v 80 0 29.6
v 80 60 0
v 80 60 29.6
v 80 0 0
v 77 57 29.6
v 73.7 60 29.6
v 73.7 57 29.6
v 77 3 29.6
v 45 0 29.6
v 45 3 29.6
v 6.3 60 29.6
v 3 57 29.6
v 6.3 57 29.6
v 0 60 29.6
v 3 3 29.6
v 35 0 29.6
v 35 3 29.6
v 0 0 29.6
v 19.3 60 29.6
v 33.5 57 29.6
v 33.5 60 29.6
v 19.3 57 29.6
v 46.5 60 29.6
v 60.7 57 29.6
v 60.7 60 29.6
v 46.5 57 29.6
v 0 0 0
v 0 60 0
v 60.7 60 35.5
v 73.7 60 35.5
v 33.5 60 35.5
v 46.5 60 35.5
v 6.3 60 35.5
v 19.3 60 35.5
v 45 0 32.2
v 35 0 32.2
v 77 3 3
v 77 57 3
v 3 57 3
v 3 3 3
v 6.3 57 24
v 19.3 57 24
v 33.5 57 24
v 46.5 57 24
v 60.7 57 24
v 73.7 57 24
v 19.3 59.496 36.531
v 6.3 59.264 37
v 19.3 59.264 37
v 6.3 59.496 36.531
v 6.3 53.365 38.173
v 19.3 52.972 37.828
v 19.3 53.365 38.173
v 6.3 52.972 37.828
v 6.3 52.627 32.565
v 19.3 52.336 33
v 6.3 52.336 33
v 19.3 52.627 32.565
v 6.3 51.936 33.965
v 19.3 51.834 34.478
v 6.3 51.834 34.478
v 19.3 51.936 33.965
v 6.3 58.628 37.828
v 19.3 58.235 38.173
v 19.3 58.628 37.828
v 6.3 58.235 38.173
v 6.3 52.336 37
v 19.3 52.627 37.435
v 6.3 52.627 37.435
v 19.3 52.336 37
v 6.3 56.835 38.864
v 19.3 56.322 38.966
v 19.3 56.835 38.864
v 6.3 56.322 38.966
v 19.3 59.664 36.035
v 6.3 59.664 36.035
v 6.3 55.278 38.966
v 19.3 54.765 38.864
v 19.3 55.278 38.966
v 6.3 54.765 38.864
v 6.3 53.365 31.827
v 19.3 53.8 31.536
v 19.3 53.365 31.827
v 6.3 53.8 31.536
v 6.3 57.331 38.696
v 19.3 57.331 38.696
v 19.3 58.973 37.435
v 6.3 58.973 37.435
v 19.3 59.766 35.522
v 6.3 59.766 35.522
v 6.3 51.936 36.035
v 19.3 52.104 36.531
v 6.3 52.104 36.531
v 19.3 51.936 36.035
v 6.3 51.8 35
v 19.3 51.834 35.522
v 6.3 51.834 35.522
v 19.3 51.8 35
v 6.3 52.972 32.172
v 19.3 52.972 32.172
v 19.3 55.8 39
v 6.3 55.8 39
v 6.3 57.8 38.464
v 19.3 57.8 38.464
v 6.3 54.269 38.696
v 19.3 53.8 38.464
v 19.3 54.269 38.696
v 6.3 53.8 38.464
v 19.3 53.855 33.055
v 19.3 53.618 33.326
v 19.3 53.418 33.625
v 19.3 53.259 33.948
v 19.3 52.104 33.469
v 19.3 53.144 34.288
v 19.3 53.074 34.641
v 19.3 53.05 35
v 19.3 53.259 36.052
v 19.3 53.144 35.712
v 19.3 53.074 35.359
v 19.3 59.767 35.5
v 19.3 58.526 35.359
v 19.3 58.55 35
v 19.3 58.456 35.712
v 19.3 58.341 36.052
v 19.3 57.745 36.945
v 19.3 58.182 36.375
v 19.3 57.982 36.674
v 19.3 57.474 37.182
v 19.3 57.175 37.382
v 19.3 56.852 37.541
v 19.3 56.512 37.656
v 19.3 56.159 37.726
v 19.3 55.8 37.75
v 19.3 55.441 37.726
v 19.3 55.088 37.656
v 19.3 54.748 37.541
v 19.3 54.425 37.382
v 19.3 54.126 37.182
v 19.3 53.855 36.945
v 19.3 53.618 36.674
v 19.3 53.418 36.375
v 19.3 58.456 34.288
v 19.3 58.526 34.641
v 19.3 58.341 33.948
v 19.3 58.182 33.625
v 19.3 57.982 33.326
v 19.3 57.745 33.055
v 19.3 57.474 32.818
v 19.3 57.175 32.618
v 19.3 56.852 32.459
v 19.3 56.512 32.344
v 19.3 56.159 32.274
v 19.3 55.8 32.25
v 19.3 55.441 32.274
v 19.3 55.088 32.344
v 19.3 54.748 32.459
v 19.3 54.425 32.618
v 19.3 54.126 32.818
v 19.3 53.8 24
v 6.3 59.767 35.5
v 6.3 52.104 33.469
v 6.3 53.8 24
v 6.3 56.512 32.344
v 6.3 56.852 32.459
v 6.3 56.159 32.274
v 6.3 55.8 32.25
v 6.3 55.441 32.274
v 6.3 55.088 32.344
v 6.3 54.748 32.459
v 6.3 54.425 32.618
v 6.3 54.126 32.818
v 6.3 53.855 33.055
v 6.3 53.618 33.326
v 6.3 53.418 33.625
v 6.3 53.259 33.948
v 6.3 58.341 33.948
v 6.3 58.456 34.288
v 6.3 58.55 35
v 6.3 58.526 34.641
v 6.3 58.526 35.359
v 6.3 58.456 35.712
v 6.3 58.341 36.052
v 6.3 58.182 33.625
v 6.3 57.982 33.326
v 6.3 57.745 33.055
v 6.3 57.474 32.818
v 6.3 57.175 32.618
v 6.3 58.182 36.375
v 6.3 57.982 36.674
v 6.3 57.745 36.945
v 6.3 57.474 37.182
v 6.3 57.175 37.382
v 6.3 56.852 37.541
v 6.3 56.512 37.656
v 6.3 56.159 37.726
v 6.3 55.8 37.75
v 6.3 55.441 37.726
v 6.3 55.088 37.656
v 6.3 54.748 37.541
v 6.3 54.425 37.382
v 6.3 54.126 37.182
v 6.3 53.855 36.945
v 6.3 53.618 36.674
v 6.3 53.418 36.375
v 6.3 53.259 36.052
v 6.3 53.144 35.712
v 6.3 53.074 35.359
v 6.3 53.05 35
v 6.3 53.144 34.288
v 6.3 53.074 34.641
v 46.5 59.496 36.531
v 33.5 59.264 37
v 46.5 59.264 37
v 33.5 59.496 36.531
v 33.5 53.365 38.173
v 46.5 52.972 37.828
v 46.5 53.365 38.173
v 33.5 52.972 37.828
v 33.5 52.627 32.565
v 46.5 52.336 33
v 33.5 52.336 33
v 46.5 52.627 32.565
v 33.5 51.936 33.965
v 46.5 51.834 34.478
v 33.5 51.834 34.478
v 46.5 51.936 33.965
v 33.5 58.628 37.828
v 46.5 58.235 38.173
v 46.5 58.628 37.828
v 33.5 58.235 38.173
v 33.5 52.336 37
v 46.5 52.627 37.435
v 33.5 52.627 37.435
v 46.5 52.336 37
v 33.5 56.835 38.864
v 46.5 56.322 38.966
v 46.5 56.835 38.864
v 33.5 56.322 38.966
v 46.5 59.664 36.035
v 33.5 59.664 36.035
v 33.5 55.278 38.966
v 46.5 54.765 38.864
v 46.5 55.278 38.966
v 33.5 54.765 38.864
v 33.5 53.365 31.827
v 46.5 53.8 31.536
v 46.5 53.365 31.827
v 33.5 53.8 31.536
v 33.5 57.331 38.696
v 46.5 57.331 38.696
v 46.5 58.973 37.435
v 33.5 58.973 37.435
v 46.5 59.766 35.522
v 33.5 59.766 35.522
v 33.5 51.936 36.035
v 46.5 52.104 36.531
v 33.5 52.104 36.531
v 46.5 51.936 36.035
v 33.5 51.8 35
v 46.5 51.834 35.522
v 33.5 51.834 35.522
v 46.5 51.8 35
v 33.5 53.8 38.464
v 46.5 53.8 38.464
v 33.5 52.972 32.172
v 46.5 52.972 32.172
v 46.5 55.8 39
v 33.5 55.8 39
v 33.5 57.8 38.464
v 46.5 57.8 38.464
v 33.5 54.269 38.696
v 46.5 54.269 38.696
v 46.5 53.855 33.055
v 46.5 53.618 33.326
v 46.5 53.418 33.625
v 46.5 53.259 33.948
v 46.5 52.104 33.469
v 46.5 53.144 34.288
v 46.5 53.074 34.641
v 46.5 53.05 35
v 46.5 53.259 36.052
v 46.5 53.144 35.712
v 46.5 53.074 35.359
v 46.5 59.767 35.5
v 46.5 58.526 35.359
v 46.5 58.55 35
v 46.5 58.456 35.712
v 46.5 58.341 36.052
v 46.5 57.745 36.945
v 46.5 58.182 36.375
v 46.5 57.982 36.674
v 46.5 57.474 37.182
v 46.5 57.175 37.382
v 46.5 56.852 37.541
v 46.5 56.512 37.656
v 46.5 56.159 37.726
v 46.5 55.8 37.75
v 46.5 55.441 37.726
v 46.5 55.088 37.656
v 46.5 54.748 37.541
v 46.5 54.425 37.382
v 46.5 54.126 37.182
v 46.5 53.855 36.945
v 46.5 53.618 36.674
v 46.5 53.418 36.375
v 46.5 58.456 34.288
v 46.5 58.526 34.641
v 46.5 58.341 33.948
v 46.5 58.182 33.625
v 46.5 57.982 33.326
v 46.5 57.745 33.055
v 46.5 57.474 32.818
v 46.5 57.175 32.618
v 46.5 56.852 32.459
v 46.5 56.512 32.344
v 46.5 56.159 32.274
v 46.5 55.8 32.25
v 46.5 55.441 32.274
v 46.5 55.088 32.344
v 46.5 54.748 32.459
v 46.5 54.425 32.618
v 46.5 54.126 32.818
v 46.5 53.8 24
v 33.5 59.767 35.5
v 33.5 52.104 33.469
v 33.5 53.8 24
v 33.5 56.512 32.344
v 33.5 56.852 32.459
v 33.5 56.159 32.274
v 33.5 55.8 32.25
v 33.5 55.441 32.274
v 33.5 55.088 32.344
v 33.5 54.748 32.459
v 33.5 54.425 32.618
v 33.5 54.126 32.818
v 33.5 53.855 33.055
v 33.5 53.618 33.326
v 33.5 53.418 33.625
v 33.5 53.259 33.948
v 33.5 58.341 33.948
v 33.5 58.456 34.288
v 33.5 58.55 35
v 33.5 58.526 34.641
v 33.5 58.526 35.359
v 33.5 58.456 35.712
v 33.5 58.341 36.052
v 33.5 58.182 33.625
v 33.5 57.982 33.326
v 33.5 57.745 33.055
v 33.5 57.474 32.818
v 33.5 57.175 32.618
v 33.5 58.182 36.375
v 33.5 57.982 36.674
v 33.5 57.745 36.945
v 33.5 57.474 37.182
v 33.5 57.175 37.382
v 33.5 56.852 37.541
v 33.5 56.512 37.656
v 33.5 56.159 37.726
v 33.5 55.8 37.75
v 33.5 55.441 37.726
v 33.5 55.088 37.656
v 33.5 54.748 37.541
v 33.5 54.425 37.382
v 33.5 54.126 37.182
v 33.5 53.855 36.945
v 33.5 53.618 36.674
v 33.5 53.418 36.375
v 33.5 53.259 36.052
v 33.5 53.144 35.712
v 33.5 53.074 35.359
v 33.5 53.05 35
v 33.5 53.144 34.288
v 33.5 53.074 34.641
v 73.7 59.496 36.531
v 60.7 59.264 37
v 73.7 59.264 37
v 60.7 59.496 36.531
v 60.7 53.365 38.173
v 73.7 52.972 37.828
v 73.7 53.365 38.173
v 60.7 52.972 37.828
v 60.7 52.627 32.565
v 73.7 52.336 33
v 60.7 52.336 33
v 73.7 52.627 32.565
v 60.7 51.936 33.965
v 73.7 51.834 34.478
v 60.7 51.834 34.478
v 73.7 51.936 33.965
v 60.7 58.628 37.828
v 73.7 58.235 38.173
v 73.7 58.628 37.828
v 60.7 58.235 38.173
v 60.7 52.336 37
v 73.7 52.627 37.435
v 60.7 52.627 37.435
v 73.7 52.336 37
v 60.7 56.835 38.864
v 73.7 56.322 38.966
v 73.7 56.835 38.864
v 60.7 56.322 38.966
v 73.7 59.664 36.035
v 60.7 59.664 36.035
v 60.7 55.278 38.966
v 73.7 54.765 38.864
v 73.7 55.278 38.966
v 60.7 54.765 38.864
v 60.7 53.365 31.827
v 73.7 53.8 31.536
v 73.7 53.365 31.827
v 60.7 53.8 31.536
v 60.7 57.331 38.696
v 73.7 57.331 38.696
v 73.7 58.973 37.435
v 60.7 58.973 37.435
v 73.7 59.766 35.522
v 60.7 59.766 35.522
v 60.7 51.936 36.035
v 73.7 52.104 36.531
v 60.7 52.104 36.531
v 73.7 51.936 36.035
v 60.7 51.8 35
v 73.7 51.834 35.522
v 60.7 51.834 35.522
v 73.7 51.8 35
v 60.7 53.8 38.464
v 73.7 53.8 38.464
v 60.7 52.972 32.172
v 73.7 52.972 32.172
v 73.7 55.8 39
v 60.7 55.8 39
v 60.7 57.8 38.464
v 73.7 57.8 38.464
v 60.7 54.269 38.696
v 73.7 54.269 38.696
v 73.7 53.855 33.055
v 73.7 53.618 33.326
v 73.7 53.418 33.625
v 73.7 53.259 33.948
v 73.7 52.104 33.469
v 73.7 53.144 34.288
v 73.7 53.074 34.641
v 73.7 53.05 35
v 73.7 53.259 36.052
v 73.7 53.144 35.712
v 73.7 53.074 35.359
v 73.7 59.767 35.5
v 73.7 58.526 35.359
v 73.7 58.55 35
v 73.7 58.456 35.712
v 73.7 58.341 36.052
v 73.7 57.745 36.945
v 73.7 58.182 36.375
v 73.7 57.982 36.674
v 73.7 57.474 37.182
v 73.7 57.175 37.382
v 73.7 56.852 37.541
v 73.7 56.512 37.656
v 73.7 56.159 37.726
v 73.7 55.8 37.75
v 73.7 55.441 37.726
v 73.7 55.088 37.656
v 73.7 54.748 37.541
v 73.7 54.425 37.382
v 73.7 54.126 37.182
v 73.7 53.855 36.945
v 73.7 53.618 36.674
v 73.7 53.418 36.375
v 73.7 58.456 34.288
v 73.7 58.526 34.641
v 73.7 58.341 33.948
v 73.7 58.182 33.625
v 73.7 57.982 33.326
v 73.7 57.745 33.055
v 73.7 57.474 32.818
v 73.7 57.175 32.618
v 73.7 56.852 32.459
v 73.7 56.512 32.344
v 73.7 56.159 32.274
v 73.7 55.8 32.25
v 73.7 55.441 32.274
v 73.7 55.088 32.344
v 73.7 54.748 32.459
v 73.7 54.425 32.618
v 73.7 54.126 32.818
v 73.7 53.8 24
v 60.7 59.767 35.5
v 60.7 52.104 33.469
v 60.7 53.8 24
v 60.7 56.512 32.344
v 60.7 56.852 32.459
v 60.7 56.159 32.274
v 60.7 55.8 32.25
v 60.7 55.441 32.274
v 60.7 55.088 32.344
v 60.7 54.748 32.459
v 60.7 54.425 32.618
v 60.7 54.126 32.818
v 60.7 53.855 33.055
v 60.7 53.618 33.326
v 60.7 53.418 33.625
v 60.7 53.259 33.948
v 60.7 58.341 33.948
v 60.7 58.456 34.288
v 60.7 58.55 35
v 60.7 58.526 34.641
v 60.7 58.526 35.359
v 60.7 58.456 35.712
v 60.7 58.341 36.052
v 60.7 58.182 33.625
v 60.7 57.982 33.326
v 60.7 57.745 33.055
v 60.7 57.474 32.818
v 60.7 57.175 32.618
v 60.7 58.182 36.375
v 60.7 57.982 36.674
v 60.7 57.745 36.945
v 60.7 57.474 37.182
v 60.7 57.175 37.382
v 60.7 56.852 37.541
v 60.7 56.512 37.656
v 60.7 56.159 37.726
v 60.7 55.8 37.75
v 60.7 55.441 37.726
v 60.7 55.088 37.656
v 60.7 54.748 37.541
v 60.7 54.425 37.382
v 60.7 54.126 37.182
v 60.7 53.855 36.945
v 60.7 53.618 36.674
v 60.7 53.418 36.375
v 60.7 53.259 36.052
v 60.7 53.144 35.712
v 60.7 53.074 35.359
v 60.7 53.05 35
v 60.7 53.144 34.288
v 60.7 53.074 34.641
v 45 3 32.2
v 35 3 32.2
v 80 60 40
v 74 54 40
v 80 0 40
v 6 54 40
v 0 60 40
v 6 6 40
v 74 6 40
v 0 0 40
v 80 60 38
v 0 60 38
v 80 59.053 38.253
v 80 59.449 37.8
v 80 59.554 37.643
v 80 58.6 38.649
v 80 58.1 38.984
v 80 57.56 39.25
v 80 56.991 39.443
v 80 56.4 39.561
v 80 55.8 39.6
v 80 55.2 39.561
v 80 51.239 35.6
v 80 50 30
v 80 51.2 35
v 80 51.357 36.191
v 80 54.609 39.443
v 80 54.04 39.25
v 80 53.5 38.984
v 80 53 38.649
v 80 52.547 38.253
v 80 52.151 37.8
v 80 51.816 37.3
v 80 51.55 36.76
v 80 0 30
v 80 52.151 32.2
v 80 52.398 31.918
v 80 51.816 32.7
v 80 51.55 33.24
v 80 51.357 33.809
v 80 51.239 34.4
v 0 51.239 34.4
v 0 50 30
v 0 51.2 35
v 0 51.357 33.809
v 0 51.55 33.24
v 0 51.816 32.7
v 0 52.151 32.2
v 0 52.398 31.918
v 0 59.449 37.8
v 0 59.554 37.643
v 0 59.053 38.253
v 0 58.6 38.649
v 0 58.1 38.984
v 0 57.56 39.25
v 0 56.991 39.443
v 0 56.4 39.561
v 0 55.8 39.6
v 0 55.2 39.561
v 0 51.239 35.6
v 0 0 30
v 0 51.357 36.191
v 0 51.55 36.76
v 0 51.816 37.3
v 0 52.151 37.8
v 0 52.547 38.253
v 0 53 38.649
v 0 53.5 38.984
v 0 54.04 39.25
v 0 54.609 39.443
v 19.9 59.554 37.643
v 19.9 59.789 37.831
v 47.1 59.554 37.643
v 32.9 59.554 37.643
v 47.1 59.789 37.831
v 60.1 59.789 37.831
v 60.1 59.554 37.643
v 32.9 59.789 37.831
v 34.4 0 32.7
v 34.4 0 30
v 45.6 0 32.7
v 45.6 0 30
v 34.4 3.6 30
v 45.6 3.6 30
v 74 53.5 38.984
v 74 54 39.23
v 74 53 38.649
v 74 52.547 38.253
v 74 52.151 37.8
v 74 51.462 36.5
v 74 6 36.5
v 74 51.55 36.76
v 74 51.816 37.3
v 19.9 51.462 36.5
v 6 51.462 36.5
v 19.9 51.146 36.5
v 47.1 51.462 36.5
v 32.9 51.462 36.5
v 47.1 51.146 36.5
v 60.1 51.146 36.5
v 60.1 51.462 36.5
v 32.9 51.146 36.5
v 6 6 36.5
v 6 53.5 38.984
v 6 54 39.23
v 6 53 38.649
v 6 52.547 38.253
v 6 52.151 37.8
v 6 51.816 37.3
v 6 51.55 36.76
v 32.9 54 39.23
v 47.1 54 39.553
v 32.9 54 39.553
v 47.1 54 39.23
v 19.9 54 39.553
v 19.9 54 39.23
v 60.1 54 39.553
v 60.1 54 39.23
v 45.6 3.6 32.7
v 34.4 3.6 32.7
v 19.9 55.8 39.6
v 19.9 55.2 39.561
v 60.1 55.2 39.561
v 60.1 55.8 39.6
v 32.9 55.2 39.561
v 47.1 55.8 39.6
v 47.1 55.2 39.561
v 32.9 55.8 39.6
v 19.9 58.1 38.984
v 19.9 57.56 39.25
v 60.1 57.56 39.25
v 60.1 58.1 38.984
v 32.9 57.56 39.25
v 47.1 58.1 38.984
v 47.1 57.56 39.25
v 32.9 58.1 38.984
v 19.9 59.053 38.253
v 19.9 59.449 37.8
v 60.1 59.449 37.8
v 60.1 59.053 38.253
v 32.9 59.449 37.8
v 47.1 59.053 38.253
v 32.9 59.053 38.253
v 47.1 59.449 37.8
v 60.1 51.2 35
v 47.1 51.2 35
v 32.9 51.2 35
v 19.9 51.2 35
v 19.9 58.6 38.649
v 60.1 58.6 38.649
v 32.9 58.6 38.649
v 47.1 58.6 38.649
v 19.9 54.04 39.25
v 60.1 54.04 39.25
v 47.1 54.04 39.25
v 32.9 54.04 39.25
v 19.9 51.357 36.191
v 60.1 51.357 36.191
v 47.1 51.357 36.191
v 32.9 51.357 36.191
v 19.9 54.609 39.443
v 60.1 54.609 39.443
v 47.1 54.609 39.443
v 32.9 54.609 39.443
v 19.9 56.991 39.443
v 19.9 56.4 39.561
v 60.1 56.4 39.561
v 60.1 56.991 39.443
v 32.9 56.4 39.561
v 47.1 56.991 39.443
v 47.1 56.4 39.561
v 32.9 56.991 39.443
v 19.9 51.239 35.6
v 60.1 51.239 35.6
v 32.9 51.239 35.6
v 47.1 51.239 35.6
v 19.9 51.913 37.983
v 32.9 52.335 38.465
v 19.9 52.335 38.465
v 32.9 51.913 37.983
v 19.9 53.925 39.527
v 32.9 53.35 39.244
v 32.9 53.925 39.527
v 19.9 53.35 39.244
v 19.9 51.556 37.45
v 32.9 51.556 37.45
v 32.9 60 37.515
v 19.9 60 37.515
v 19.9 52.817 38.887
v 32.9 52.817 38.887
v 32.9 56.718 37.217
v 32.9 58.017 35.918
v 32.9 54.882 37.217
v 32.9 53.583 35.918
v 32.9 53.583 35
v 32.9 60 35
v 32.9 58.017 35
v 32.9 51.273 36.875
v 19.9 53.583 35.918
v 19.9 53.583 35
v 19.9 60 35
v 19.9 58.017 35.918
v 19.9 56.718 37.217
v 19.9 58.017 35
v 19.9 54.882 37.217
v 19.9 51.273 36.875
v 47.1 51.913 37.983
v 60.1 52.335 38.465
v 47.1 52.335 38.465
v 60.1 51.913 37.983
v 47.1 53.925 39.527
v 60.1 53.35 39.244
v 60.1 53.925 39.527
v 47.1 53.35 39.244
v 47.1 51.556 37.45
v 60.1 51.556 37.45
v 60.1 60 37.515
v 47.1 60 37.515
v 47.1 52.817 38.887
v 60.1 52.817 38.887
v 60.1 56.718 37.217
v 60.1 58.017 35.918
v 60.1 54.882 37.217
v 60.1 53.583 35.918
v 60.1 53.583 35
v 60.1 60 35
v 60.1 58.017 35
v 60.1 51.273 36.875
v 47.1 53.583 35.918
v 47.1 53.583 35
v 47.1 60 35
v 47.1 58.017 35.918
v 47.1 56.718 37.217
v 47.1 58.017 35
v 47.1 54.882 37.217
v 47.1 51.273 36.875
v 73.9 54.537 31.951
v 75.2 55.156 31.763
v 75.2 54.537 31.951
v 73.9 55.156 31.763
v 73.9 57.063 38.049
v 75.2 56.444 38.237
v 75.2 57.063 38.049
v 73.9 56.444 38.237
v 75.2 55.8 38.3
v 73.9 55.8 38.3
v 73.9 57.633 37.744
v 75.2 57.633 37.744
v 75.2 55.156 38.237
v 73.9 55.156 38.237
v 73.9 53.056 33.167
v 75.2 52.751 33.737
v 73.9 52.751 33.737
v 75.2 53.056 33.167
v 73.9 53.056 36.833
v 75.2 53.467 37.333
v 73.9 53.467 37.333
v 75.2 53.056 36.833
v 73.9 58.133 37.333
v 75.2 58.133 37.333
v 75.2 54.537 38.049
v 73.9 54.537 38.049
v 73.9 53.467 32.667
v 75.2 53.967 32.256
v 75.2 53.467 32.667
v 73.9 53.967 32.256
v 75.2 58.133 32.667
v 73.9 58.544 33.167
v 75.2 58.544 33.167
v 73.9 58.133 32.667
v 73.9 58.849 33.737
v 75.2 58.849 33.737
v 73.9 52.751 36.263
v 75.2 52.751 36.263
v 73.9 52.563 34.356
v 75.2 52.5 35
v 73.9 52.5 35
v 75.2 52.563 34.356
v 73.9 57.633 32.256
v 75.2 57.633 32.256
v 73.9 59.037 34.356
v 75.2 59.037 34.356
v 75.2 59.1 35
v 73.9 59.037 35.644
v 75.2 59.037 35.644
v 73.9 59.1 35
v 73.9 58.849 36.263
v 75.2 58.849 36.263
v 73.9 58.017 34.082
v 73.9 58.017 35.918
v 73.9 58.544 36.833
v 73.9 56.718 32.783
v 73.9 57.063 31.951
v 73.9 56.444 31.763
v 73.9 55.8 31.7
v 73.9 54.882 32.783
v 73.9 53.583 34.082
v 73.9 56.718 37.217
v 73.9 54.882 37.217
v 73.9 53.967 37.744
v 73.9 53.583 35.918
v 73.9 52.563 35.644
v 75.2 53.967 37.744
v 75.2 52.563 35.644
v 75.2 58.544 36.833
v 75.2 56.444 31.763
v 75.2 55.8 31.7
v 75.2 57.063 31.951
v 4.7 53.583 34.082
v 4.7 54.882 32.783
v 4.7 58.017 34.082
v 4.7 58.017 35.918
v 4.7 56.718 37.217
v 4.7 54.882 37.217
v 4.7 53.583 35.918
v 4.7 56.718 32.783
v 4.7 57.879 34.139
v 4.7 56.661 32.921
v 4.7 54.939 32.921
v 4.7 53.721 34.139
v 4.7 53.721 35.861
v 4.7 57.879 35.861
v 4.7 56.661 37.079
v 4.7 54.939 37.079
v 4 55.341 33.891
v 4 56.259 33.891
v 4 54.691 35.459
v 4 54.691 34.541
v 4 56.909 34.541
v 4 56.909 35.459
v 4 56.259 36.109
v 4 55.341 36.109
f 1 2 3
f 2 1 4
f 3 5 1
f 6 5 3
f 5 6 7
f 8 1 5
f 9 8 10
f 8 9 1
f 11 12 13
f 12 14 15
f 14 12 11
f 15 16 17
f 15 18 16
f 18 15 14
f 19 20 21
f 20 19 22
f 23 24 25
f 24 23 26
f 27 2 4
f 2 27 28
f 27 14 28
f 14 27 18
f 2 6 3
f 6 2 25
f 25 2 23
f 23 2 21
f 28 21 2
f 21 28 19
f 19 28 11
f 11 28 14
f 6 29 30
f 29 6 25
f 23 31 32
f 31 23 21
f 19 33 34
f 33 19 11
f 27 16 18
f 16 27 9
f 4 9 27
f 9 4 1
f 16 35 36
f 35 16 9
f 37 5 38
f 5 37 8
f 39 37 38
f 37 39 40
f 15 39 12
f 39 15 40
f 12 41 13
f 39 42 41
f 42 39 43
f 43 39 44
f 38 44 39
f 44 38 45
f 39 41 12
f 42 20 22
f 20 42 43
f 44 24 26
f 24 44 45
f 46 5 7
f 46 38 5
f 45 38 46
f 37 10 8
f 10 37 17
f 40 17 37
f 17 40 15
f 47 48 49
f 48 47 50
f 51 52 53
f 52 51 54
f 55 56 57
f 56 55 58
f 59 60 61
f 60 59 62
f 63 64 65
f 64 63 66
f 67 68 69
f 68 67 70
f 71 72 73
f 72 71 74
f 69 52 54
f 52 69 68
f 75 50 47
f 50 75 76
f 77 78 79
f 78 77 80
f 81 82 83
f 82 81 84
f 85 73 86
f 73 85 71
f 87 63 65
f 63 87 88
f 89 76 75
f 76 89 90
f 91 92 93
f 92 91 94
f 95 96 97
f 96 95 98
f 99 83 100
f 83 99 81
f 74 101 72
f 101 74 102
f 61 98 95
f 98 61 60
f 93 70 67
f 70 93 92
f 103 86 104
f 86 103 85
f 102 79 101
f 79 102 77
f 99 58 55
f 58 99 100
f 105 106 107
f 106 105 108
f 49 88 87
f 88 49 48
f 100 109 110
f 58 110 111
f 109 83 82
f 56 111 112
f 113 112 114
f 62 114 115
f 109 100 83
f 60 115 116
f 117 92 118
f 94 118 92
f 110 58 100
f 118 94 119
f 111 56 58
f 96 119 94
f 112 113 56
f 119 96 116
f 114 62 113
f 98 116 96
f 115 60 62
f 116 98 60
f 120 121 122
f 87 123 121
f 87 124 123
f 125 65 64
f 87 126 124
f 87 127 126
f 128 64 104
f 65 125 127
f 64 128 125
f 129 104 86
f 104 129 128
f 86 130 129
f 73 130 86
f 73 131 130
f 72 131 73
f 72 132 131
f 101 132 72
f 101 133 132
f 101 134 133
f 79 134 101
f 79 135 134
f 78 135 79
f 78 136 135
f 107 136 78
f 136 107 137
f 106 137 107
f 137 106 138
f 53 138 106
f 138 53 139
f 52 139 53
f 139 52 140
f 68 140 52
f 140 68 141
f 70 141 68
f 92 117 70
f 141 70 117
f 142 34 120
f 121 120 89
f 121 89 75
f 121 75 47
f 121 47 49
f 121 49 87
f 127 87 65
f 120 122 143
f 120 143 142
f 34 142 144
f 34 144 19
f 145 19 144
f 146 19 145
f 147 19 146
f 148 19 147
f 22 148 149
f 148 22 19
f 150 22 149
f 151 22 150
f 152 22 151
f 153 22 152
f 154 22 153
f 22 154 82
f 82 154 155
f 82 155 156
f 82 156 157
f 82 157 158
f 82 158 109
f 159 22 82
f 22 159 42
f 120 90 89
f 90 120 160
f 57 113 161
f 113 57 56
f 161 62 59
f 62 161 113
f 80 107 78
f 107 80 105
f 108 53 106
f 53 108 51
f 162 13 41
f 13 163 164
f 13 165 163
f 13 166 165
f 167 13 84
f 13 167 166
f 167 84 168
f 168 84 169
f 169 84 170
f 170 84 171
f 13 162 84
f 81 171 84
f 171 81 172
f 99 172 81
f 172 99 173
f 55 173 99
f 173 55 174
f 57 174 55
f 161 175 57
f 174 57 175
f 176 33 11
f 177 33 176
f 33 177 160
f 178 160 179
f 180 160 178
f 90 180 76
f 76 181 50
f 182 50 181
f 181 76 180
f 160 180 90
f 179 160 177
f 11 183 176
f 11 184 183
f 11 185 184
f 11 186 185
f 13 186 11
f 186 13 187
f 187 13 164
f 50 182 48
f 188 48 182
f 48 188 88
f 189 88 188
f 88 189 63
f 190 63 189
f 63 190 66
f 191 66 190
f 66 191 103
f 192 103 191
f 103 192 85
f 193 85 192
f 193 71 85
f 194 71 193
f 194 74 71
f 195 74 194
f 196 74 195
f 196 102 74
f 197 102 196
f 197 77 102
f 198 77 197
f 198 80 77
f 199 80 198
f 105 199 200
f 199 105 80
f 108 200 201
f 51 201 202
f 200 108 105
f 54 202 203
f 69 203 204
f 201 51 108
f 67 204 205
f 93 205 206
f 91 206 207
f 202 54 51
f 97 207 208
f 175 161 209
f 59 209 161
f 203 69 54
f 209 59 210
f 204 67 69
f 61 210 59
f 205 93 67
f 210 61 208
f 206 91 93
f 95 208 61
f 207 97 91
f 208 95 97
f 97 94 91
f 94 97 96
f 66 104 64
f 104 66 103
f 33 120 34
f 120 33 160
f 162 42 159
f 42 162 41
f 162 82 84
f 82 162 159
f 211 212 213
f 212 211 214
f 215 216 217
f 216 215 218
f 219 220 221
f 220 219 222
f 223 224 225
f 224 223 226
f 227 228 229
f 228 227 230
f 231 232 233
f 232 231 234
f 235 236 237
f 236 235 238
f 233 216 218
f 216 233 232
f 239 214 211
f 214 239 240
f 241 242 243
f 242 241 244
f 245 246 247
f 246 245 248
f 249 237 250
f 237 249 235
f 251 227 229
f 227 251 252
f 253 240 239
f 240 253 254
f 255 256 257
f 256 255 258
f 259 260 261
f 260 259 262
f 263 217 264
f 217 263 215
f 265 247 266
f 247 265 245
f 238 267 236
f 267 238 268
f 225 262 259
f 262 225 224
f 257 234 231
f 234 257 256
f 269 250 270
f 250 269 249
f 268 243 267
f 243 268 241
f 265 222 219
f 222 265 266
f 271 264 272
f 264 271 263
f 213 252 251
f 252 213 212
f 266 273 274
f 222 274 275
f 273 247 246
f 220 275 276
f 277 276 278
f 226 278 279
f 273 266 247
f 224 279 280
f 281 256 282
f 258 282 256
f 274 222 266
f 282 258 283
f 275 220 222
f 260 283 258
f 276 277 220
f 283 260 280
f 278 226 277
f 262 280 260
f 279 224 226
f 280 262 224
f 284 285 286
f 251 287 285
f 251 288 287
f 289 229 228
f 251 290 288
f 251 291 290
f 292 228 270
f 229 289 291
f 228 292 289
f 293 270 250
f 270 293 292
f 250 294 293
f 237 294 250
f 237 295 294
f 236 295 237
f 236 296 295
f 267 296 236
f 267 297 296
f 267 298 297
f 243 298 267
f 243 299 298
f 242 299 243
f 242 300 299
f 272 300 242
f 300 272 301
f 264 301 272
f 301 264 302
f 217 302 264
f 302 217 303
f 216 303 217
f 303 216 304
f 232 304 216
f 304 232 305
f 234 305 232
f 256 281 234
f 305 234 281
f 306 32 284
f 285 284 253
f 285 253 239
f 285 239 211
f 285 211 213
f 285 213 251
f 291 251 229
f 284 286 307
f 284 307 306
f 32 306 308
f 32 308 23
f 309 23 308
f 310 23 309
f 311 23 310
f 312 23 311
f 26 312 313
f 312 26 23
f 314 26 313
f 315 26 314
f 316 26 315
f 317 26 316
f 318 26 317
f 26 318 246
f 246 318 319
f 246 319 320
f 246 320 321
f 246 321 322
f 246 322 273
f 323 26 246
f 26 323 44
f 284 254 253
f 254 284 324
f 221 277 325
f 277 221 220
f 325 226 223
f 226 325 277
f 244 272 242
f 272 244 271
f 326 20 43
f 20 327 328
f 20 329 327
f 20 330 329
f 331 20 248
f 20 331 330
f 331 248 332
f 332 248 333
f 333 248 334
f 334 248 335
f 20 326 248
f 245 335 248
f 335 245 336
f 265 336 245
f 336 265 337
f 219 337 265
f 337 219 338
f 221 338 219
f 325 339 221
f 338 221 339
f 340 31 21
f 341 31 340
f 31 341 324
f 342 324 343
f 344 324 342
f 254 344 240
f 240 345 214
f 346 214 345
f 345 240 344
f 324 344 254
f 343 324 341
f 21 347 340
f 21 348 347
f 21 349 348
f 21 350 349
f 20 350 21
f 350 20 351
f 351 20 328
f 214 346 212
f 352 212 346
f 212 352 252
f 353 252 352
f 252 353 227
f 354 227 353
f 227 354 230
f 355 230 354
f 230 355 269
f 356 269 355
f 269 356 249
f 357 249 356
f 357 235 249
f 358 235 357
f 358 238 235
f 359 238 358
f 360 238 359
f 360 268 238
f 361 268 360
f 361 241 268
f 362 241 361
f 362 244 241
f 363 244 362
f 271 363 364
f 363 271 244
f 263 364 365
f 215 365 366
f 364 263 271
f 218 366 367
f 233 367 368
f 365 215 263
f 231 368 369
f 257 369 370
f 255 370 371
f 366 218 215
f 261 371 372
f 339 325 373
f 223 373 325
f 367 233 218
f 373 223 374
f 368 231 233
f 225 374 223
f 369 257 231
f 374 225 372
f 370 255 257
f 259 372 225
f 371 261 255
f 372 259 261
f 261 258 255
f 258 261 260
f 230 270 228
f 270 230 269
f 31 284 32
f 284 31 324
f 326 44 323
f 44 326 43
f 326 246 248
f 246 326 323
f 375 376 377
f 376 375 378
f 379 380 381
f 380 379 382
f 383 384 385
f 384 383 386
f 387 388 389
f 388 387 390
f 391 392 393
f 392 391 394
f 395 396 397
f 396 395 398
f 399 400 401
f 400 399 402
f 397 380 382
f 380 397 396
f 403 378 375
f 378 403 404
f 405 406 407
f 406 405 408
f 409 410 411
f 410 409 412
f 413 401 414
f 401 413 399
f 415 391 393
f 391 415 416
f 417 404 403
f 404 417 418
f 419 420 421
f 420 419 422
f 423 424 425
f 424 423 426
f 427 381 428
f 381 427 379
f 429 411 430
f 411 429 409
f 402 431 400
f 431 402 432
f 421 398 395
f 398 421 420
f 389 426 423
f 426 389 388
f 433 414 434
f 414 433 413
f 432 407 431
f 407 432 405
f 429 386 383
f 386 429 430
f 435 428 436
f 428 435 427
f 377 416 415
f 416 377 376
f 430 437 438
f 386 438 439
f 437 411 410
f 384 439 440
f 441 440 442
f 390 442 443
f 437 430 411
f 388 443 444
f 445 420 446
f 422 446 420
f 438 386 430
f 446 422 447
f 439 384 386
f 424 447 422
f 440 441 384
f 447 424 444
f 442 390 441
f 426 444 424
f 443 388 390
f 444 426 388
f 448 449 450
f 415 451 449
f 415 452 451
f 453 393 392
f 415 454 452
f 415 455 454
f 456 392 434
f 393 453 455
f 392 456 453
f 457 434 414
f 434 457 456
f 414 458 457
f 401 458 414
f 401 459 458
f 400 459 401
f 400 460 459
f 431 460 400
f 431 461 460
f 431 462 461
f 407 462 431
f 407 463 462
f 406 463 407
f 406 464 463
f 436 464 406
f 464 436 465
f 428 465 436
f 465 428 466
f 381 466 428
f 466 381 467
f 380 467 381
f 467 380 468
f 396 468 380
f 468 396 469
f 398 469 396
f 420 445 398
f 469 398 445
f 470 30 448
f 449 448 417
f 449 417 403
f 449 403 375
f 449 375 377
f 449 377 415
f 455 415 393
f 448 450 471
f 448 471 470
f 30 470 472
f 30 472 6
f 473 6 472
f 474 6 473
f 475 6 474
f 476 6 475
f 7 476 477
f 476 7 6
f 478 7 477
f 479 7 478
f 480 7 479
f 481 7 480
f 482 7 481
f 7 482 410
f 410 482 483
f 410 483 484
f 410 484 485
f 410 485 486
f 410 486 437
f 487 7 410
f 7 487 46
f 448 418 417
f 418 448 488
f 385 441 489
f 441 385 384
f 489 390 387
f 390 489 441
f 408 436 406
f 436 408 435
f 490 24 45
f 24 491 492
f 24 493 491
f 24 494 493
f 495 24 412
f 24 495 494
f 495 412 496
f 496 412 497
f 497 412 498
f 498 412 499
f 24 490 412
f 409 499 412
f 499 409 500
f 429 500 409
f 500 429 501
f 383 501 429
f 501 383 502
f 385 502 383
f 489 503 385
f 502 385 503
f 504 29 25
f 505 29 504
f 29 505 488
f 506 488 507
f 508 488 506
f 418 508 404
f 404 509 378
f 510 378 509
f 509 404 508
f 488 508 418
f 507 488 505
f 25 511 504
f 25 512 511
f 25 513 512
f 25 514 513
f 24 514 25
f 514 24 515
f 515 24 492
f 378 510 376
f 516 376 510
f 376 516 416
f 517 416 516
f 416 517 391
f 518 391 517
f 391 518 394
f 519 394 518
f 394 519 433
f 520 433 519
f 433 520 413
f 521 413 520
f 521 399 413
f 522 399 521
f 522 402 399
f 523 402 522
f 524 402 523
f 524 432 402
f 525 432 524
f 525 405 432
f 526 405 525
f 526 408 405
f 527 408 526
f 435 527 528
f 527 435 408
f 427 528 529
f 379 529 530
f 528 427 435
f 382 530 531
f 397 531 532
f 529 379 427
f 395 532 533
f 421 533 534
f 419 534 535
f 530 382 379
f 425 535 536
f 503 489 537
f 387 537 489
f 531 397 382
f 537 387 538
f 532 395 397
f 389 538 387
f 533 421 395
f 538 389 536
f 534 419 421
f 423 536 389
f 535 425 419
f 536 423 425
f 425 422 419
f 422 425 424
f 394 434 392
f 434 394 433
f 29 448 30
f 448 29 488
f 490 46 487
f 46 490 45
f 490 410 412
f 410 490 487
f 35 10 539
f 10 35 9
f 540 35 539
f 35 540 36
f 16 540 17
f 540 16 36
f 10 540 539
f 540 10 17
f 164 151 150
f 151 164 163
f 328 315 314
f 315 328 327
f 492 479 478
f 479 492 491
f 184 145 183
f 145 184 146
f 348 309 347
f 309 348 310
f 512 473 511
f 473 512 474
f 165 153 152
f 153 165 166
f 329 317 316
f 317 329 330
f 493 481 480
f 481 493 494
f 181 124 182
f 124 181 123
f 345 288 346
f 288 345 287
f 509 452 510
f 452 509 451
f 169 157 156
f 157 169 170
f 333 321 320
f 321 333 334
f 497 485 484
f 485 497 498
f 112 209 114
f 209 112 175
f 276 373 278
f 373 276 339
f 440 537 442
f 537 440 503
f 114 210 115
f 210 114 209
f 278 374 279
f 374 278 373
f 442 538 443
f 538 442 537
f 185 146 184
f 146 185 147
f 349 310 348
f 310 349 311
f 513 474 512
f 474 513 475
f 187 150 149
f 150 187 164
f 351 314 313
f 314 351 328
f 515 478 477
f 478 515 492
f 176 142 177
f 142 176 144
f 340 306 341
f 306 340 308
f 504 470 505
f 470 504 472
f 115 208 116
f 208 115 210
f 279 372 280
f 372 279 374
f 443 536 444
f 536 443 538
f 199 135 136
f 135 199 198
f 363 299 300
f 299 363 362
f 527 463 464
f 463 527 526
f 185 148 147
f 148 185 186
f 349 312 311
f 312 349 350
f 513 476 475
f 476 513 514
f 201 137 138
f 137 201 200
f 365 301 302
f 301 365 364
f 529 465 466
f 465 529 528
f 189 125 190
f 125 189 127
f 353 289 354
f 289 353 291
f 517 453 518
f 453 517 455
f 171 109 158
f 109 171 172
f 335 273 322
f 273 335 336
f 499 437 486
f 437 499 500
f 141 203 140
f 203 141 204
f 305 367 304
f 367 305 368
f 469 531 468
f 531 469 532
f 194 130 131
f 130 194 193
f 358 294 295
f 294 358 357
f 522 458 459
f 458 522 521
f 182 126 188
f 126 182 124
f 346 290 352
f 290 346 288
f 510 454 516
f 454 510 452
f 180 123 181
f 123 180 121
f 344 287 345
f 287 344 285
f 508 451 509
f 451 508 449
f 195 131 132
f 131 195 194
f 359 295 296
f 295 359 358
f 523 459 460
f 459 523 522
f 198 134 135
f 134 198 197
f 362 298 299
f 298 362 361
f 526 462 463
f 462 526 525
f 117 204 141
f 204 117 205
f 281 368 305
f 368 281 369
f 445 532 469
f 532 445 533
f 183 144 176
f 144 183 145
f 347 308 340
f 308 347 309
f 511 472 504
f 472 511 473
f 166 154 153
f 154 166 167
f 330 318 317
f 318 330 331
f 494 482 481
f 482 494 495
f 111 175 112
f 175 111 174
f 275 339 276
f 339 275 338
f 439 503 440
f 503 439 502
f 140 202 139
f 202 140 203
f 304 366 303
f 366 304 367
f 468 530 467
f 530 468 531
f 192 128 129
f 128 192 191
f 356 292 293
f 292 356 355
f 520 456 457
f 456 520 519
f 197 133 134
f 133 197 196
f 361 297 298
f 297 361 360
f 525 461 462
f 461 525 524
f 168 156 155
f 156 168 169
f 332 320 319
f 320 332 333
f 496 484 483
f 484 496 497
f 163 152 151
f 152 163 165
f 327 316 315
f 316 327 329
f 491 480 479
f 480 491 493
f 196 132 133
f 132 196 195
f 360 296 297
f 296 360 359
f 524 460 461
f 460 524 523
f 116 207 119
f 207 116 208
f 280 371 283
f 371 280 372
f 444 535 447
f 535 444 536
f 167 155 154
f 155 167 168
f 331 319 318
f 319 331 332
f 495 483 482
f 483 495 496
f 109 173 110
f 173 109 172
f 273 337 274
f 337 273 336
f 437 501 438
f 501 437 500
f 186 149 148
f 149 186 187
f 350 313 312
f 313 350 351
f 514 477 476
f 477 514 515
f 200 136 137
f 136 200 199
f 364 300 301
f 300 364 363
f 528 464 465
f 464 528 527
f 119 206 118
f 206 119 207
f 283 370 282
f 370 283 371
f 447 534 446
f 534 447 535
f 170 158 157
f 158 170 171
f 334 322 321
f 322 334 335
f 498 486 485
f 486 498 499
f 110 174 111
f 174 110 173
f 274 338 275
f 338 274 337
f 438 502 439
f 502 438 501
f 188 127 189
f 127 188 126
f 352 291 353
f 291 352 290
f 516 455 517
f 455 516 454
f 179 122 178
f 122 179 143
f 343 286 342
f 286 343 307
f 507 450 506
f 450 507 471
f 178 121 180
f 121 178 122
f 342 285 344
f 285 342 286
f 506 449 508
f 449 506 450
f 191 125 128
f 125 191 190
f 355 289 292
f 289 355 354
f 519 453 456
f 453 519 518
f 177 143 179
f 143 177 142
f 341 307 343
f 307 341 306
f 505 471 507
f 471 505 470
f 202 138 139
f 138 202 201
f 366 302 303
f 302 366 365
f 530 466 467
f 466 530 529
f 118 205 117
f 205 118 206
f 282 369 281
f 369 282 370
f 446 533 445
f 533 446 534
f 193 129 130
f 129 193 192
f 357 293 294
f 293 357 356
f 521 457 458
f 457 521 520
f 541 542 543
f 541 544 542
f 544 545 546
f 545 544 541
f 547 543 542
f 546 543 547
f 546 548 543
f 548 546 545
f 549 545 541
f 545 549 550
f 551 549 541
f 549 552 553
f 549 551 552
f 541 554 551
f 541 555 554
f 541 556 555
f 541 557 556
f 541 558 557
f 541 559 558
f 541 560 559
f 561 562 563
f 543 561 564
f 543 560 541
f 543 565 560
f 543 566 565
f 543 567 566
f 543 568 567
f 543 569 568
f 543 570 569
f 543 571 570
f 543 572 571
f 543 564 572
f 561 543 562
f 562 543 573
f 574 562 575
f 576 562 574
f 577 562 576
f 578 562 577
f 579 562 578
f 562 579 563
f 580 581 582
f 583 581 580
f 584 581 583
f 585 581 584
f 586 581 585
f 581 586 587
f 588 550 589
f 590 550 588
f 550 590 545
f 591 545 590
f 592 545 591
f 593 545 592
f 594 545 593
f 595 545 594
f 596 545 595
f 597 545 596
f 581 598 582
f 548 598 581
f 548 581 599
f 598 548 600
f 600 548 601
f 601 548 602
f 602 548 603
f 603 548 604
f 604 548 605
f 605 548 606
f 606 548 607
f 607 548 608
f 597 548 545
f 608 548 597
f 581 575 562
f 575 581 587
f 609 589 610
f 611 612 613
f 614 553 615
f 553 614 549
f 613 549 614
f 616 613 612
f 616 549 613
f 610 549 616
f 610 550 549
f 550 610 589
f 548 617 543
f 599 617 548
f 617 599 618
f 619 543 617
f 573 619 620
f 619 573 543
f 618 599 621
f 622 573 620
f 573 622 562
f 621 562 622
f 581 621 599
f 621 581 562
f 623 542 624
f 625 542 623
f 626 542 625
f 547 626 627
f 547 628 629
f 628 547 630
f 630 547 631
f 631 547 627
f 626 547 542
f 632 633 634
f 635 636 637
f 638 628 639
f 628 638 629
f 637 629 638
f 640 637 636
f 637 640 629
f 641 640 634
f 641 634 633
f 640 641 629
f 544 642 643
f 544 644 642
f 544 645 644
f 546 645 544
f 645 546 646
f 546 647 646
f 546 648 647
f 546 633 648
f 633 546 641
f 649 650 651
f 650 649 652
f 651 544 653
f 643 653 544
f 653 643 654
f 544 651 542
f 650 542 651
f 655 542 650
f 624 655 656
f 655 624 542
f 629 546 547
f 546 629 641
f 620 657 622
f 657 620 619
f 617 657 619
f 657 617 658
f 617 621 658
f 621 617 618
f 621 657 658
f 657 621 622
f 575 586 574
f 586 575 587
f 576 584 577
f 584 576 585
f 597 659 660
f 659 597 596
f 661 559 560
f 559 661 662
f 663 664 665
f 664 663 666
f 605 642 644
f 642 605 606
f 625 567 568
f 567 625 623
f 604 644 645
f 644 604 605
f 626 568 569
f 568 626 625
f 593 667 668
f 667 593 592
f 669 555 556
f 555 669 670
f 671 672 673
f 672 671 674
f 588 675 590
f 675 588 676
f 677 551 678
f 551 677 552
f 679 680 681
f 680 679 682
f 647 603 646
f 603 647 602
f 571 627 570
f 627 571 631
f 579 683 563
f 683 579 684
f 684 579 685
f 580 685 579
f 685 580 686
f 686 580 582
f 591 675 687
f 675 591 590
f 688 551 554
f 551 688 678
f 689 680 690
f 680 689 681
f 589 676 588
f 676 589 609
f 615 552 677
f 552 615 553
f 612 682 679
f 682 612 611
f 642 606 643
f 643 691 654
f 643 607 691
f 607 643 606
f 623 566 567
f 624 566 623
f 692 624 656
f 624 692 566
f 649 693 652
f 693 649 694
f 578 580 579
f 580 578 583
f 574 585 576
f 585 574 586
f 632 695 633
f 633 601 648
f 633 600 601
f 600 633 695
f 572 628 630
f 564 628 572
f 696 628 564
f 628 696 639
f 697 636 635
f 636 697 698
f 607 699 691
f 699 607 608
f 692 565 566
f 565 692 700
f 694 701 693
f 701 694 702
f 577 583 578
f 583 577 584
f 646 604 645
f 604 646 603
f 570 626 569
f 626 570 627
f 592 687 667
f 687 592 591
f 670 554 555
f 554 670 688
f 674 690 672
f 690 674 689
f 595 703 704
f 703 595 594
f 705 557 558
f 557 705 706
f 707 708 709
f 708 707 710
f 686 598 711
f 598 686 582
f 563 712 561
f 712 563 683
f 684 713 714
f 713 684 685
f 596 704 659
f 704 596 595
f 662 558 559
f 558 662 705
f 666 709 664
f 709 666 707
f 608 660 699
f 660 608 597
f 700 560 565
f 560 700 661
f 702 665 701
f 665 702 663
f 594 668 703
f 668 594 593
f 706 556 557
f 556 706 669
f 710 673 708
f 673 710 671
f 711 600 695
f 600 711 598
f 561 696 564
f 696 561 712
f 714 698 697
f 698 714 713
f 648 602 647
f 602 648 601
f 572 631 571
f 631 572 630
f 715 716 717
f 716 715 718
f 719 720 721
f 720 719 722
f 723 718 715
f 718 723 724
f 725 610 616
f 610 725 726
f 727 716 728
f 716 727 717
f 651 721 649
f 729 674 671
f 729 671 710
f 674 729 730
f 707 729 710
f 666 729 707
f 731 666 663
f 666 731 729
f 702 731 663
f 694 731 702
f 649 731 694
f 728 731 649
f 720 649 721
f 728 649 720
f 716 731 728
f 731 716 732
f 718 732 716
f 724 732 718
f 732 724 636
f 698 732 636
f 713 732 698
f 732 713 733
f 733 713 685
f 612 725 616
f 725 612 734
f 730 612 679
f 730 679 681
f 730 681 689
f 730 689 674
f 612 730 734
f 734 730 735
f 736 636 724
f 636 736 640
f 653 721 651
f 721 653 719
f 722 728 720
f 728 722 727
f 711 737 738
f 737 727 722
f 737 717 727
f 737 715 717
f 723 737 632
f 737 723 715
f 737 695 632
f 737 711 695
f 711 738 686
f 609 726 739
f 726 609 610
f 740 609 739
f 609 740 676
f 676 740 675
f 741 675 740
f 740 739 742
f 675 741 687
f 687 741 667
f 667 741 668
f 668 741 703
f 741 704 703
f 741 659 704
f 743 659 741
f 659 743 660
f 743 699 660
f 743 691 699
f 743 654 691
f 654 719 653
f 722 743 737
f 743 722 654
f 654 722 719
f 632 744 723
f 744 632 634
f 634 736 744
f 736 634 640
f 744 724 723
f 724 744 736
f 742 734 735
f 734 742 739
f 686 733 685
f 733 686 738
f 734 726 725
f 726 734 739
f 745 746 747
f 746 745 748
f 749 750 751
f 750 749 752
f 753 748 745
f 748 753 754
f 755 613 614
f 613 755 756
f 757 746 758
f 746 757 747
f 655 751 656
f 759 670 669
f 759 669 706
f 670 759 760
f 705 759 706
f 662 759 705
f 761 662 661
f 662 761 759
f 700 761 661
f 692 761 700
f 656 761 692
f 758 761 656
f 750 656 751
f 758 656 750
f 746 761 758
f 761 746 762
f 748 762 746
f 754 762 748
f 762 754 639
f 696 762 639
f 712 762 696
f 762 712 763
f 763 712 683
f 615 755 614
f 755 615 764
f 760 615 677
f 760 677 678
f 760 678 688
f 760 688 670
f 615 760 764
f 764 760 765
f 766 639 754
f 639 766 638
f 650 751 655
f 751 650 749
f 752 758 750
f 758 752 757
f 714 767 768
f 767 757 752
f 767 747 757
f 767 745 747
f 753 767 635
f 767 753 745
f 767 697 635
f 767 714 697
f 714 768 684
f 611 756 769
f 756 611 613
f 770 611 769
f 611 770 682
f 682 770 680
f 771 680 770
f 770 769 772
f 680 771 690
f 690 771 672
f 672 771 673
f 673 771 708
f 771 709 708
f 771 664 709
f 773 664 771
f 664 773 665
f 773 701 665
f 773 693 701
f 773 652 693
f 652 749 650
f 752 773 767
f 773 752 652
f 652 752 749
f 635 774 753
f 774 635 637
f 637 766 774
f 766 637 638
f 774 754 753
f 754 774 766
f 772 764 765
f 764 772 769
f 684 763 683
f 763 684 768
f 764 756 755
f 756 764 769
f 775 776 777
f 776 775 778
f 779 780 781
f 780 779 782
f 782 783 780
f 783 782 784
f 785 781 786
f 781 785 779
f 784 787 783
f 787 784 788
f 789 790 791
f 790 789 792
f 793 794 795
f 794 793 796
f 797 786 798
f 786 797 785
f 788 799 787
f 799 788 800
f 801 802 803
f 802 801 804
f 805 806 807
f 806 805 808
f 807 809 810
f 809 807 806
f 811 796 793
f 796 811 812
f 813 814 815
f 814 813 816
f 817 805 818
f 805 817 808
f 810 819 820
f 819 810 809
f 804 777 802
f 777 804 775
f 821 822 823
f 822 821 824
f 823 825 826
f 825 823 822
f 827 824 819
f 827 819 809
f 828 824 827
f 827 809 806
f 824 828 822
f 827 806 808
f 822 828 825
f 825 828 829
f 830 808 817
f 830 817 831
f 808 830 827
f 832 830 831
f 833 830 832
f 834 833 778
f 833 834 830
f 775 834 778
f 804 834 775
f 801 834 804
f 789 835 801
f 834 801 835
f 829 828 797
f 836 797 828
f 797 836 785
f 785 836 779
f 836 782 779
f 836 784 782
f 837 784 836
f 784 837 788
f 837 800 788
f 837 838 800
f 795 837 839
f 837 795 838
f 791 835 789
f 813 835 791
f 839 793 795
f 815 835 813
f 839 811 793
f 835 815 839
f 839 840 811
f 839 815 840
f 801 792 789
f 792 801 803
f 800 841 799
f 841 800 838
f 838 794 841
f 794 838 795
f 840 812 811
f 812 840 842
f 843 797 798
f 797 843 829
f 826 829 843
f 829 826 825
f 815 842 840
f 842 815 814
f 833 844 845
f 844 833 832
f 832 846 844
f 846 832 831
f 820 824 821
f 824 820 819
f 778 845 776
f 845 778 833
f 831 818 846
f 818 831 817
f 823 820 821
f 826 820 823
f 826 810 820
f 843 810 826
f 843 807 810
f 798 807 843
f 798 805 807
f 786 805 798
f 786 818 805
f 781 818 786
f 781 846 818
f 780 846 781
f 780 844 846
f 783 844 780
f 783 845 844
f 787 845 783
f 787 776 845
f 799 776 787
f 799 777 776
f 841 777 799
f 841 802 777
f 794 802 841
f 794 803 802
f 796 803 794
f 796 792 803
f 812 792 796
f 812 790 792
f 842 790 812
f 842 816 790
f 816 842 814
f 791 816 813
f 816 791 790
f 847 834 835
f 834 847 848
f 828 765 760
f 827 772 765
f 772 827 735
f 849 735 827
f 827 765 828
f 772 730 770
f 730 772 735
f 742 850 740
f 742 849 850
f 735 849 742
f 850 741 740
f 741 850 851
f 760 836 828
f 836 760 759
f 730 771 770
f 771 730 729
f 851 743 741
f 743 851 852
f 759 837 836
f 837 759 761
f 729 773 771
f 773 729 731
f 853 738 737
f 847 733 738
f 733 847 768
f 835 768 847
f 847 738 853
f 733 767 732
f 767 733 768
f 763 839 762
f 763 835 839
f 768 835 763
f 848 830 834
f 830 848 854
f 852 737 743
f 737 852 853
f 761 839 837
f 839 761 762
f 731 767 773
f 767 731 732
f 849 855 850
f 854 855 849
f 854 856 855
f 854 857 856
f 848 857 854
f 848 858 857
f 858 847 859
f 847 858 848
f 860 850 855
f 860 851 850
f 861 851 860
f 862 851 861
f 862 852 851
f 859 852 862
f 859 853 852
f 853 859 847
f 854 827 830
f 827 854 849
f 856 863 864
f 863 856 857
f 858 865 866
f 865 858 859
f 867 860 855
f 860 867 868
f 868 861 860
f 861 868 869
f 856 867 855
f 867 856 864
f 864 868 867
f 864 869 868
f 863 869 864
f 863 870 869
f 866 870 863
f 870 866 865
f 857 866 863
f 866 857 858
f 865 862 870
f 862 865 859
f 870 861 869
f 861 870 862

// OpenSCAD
// Print-in-place hinged box, 80 x 60 x 40 mm closed.
// Printed closed in PLA (Bambu A1, 0.4 nozzle): base, lid and a captive
// hinge pin are separate bodies with 0.35-0.6 mm clearances, so the hinge
// breaks free by hand.  No supports: the lid underside bridges the cavity,
// the hinge barrels/pin use faceted (octagonal) lower surfaces, and all
// other downward faces are short bridges or rest on the body below.

/* [Part] */
part = "assembly"; // [assembly, box, lid, pin]

/* [Dimensions] */
box_w = 80;          // X, outside
box_d = 60;          // Y, outside (front y=0, back y=60)
box_h = 29.6;        // base height to its rim
lid_h = 10;          // lid height; lid bottom at z=30 (0.4 gap)
lid_z = 30;
wall = 3;
floor_t = 3;
total_h = 40;

hinge_y = 55.8;      // hinge axis, assembly coords
hinge_z = 35;
barrel_r = 4.0;
pin_r = 2.4;         // octagon circumradius
bore_r = 2.75;       // pin_r + 0.35 radial clearance
relief_r = 4.6;      // barrel_r + 0.6

// Alternating knuckles along the back edge (x intervals), 0.6 mm end gaps.
box_segs  = [[6.3, 19.3], [33.5, 46.5], [60.7, 73.7]];
lid_segs  = [[19.9, 32.9], [47.1, 60.1]];

cadverify_only = "";
module instance(name, part_name, unit = 1) {
    echo(cadverify_instance = [name, part_name, unit]);
    if (cadverify_only == "" || cadverify_only == name) children();
}

// ---------------------------------------------------------------- base (box)
module box_main() {
    difference() {
        union() {
            // shell: outer block minus open-top cavity
            difference() {
                cube([box_w, box_d, box_h]);
                translate([wall, wall, floor_t]) cube([box_w - 2 * wall, box_d - 2 * wall, box_h]);
            }
            // hinge knuckles (base) + support posts down to the back wall
            for (s = box_segs) {
                translate([s[0], hinge_y, hinge_z]) rotate([0, 90, 0])
                    cylinder(h = s[1] - s[0], r = barrel_r, $fn = 48);
                translate([s[0], 53.8, 24]) cube([s[1] - s[0], 6.2, 11.5]);
            }
            // front catch tooth (enters the socket in the lid)
            translate([35, 0, box_h]) cube([10, wall, 2.6]);
        }
        // pin bore through the base knuckles
        translate([-1, hinge_y, hinge_z]) rotate([0, 90, 0])
            cylinder(h = box_w + 2, r = bore_r, $fn = 48);
    }
}

// ---------------------------------------------------------------- lid (local: z 0..10, hinge axis at z=5)
module lid_main() {
    union() {
        difference() {
            union() {
                // main slab, side profile (Y-Z) extruded along X.
                // Rear lower edge chamfered 50,0 -> 60,8 so the slab
                // swings clear of the base back wall.
                rotate([0, 90, 0])
                    linear_extrude(height = box_w)
                        polygon(points = [[0, 0], [0, 50], [-8, 60], [-10, 60], [-10, 0]]);
                // hinge knuckles (lid)
                for (s = lid_segs)
                    translate([s[0], hinge_y, 5]) rotate([0, 90, 0])
                        cylinder(h = s[1] - s[0], r = barrel_r, $fn = 48);
            }
            // recessed panel in the top face
            translate([6, 6, 6.5]) cube([68, 48, 4]);
            // front catch socket (tooth: x35..45, z assy 29.6..32.2)
            translate([34.4, -1, -0.5]) cube([11.2, 4.6, 3.2]);
            // clearance tunnel for the base knuckles / pin
            translate([-1, hinge_y, 5]) rotate([0, 90, 0])
                cylinder(h = box_w + 2, r = relief_r, $fn = 48);
            // pin bore through the lid knuckles
            translate([-1, hinge_y, 5]) rotate([0, 90, 0])
                cylinder(h = box_w + 2, r = bore_r, $fn = 48);
        }
        // webs joining lid knuckles to the slab: upper half-discs r=4.9
        // (stay above z=30.1 in assembly, clear of the base rim at 29.6)
        for (s = lid_segs)
            intersection() {
                translate([s[0], hinge_y, 5]) rotate([0, 90, 0])
                    cylinder(h = s[1] - s[0], r = 4.9, $fn = 48);
                translate([s[0], hinge_y - 10, 5]) cube([s[1] - s[0], 20, 5]);
                translate([s[0], 0, 0]) cube([s[1] - s[0], box_d, lid_h]);
            }
    }
}

// ---------------------------------------------------------------- pin
// Centred on its axis, local +Z from head (z=0) to tip (z=71.2).
module pin_geom() {
    union() {
        cylinder(h = 1.3, r = 3.3, $fn = 32);                    // head
        translate([0, 0, 1.0]) rotate([0, 0, 22.5])
            cylinder(h = 69.5, r = pin_r, $fn = 8);              // octagonal shaft
        translate([0, 0, 70.4]) rotate([0, 0, 22.5])
            cylinder(h = 0.8, r1 = pin_r, r2 = 1.2, $fn = 8);    // lead-in tip
    }
}
module pin_part() { translate([3.3, 3.3, 0]) pin_geom(); }

// ---------------------------------------------------------------- output
if (part == "box") {
    echo(cadverify_spec = [
        ["bounds", [[0, 0, 0], [box_w, box_d, hinge_z + barrel_r]]],
        ["bodies", 1],
        ["copies", 1],
        ["support_faces", [["bed", "-z", 4000]]],
        ["overhangs_allowed", [["hinge knuckles and pin bore print in place; faceted bore ceiling is a short internal bridge", [[5, 51, 30], [75, 60, 39.5]]]]],
        ["details", [
            ["cavity", "void", [[4, 4, 10], [76, 53, 29]], 0.95],
            ["front_wall", "thickness", [40, -1, 15], [0, 1, 0], 3],
            ["floor", "thickness", [40, 30, -1], [0, 0, 1], 3],
            ["box_knuckle", "material", [[7, 52, 33.5], [18, 53.8, 36.5]], 0.6],
            ["pin_bore", "void", [[8, 54.9, 34.1], [17, 56.7, 35.9]], 0.9],
            ["catch_tooth", "material", [[36, 0.5, 30], [44, 2.5, 32]], 0.85],
            ["hinge_knuckles", "view", [[4, 50, 28], [76, 60, 39.5]]]
        ]]
    ]);
    box_main();
} else if (part == "lid") {
    echo(cadverify_spec = [
        ["bounds", [[0, 0, 0], [box_w, box_d, lid_h]]],
        ["bodies", 1],
        ["copies", 1],
        ["support_faces", [["print_face", "-z", 3000]]],
        ["overhangs_allowed", [["lid knuckle bores print in place around the pin; bore ceilings are short internal bridges", [[5, 51, 0], [75, 60, 10]]]]],
        ["details", [
            ["top_pocket", "void", [[7, 7, 6.6], [73, 53, 9.9]], 0.95],
            ["lid_slab", "thickness", [40, 30, 9], [0, 0, -1], 6.5],
            ["lid_knuckle", "material", [[21, 52, 3.5], [32, 53.8, 6.5]], 0.45],
            ["pin_bore", "void", [[22, 55.4, 4.6], [31, 56.2, 5.4]], 0.9],
            ["catch_socket", "void", [[35, 0.5, 0.2], [45, 2.5, 2.5]], 0.9],
            ["hinge_knuckles", "view", [[4, 50, 0], [76, 60, 10]]]
        ]]
    ]);
    lid_main();
} else if (part == "pin") {
    echo(cadverify_spec = [
        ["bounds", [[0, 0, 0], [6.6, 6.6, 71.2]]],
        ["bodies", 1],
        ["copies", 1],
        ["support_faces", [["head_base", "-z", 30]]],
        ["overhangs_allowed", []],
        ["details", [
            ["pin_shaft", "material", [[2, 2, 10], [4.6, 4.6, 20]], 0.9],
            ["pin_head", "material", [[1, 1, 0.1], [5.6, 5.6, 1.2]], 0.75],
            ["pin_length", "thickness", [1.2, 3.3, 72], [0, 0, -1], 71.2],
            ["pin_head_view", "view", [[0, 0, 0], [6.6, 6.6, 2]]]
        ]]
    ]);
    pin_part();
} else if (part == "assembly") {
    echo(cadverify_spec = [
        ["bounds", [[0, 0, 0], [box_w, box_d, total_h]]],
        ["support_faces", [["bed", "-z", 4000]]],
        ["allowed_interferences", []],
        ["motions", [
            ["lid_swing", ["lid"], "rotate", [0, hinge_y, hinge_z], [-1, 0, 0], [0, 110]]
        ]],
        ["assembly_order", [
            [["base"], [0, 0, 0]],
            [["lid"], [0, 0, -1]],
            [["pin"], [-1, 0, 0]]
        ]]
    ]);
    instance("base", "box") box_main();
    instance("lid", "lid") translate([0, 0, lid_z]) lid_main();
    instance("pin", "pin") translate([75.2, hinge_y, hinge_z]) rotate([0, -90, 0]) pin_geom();
}
